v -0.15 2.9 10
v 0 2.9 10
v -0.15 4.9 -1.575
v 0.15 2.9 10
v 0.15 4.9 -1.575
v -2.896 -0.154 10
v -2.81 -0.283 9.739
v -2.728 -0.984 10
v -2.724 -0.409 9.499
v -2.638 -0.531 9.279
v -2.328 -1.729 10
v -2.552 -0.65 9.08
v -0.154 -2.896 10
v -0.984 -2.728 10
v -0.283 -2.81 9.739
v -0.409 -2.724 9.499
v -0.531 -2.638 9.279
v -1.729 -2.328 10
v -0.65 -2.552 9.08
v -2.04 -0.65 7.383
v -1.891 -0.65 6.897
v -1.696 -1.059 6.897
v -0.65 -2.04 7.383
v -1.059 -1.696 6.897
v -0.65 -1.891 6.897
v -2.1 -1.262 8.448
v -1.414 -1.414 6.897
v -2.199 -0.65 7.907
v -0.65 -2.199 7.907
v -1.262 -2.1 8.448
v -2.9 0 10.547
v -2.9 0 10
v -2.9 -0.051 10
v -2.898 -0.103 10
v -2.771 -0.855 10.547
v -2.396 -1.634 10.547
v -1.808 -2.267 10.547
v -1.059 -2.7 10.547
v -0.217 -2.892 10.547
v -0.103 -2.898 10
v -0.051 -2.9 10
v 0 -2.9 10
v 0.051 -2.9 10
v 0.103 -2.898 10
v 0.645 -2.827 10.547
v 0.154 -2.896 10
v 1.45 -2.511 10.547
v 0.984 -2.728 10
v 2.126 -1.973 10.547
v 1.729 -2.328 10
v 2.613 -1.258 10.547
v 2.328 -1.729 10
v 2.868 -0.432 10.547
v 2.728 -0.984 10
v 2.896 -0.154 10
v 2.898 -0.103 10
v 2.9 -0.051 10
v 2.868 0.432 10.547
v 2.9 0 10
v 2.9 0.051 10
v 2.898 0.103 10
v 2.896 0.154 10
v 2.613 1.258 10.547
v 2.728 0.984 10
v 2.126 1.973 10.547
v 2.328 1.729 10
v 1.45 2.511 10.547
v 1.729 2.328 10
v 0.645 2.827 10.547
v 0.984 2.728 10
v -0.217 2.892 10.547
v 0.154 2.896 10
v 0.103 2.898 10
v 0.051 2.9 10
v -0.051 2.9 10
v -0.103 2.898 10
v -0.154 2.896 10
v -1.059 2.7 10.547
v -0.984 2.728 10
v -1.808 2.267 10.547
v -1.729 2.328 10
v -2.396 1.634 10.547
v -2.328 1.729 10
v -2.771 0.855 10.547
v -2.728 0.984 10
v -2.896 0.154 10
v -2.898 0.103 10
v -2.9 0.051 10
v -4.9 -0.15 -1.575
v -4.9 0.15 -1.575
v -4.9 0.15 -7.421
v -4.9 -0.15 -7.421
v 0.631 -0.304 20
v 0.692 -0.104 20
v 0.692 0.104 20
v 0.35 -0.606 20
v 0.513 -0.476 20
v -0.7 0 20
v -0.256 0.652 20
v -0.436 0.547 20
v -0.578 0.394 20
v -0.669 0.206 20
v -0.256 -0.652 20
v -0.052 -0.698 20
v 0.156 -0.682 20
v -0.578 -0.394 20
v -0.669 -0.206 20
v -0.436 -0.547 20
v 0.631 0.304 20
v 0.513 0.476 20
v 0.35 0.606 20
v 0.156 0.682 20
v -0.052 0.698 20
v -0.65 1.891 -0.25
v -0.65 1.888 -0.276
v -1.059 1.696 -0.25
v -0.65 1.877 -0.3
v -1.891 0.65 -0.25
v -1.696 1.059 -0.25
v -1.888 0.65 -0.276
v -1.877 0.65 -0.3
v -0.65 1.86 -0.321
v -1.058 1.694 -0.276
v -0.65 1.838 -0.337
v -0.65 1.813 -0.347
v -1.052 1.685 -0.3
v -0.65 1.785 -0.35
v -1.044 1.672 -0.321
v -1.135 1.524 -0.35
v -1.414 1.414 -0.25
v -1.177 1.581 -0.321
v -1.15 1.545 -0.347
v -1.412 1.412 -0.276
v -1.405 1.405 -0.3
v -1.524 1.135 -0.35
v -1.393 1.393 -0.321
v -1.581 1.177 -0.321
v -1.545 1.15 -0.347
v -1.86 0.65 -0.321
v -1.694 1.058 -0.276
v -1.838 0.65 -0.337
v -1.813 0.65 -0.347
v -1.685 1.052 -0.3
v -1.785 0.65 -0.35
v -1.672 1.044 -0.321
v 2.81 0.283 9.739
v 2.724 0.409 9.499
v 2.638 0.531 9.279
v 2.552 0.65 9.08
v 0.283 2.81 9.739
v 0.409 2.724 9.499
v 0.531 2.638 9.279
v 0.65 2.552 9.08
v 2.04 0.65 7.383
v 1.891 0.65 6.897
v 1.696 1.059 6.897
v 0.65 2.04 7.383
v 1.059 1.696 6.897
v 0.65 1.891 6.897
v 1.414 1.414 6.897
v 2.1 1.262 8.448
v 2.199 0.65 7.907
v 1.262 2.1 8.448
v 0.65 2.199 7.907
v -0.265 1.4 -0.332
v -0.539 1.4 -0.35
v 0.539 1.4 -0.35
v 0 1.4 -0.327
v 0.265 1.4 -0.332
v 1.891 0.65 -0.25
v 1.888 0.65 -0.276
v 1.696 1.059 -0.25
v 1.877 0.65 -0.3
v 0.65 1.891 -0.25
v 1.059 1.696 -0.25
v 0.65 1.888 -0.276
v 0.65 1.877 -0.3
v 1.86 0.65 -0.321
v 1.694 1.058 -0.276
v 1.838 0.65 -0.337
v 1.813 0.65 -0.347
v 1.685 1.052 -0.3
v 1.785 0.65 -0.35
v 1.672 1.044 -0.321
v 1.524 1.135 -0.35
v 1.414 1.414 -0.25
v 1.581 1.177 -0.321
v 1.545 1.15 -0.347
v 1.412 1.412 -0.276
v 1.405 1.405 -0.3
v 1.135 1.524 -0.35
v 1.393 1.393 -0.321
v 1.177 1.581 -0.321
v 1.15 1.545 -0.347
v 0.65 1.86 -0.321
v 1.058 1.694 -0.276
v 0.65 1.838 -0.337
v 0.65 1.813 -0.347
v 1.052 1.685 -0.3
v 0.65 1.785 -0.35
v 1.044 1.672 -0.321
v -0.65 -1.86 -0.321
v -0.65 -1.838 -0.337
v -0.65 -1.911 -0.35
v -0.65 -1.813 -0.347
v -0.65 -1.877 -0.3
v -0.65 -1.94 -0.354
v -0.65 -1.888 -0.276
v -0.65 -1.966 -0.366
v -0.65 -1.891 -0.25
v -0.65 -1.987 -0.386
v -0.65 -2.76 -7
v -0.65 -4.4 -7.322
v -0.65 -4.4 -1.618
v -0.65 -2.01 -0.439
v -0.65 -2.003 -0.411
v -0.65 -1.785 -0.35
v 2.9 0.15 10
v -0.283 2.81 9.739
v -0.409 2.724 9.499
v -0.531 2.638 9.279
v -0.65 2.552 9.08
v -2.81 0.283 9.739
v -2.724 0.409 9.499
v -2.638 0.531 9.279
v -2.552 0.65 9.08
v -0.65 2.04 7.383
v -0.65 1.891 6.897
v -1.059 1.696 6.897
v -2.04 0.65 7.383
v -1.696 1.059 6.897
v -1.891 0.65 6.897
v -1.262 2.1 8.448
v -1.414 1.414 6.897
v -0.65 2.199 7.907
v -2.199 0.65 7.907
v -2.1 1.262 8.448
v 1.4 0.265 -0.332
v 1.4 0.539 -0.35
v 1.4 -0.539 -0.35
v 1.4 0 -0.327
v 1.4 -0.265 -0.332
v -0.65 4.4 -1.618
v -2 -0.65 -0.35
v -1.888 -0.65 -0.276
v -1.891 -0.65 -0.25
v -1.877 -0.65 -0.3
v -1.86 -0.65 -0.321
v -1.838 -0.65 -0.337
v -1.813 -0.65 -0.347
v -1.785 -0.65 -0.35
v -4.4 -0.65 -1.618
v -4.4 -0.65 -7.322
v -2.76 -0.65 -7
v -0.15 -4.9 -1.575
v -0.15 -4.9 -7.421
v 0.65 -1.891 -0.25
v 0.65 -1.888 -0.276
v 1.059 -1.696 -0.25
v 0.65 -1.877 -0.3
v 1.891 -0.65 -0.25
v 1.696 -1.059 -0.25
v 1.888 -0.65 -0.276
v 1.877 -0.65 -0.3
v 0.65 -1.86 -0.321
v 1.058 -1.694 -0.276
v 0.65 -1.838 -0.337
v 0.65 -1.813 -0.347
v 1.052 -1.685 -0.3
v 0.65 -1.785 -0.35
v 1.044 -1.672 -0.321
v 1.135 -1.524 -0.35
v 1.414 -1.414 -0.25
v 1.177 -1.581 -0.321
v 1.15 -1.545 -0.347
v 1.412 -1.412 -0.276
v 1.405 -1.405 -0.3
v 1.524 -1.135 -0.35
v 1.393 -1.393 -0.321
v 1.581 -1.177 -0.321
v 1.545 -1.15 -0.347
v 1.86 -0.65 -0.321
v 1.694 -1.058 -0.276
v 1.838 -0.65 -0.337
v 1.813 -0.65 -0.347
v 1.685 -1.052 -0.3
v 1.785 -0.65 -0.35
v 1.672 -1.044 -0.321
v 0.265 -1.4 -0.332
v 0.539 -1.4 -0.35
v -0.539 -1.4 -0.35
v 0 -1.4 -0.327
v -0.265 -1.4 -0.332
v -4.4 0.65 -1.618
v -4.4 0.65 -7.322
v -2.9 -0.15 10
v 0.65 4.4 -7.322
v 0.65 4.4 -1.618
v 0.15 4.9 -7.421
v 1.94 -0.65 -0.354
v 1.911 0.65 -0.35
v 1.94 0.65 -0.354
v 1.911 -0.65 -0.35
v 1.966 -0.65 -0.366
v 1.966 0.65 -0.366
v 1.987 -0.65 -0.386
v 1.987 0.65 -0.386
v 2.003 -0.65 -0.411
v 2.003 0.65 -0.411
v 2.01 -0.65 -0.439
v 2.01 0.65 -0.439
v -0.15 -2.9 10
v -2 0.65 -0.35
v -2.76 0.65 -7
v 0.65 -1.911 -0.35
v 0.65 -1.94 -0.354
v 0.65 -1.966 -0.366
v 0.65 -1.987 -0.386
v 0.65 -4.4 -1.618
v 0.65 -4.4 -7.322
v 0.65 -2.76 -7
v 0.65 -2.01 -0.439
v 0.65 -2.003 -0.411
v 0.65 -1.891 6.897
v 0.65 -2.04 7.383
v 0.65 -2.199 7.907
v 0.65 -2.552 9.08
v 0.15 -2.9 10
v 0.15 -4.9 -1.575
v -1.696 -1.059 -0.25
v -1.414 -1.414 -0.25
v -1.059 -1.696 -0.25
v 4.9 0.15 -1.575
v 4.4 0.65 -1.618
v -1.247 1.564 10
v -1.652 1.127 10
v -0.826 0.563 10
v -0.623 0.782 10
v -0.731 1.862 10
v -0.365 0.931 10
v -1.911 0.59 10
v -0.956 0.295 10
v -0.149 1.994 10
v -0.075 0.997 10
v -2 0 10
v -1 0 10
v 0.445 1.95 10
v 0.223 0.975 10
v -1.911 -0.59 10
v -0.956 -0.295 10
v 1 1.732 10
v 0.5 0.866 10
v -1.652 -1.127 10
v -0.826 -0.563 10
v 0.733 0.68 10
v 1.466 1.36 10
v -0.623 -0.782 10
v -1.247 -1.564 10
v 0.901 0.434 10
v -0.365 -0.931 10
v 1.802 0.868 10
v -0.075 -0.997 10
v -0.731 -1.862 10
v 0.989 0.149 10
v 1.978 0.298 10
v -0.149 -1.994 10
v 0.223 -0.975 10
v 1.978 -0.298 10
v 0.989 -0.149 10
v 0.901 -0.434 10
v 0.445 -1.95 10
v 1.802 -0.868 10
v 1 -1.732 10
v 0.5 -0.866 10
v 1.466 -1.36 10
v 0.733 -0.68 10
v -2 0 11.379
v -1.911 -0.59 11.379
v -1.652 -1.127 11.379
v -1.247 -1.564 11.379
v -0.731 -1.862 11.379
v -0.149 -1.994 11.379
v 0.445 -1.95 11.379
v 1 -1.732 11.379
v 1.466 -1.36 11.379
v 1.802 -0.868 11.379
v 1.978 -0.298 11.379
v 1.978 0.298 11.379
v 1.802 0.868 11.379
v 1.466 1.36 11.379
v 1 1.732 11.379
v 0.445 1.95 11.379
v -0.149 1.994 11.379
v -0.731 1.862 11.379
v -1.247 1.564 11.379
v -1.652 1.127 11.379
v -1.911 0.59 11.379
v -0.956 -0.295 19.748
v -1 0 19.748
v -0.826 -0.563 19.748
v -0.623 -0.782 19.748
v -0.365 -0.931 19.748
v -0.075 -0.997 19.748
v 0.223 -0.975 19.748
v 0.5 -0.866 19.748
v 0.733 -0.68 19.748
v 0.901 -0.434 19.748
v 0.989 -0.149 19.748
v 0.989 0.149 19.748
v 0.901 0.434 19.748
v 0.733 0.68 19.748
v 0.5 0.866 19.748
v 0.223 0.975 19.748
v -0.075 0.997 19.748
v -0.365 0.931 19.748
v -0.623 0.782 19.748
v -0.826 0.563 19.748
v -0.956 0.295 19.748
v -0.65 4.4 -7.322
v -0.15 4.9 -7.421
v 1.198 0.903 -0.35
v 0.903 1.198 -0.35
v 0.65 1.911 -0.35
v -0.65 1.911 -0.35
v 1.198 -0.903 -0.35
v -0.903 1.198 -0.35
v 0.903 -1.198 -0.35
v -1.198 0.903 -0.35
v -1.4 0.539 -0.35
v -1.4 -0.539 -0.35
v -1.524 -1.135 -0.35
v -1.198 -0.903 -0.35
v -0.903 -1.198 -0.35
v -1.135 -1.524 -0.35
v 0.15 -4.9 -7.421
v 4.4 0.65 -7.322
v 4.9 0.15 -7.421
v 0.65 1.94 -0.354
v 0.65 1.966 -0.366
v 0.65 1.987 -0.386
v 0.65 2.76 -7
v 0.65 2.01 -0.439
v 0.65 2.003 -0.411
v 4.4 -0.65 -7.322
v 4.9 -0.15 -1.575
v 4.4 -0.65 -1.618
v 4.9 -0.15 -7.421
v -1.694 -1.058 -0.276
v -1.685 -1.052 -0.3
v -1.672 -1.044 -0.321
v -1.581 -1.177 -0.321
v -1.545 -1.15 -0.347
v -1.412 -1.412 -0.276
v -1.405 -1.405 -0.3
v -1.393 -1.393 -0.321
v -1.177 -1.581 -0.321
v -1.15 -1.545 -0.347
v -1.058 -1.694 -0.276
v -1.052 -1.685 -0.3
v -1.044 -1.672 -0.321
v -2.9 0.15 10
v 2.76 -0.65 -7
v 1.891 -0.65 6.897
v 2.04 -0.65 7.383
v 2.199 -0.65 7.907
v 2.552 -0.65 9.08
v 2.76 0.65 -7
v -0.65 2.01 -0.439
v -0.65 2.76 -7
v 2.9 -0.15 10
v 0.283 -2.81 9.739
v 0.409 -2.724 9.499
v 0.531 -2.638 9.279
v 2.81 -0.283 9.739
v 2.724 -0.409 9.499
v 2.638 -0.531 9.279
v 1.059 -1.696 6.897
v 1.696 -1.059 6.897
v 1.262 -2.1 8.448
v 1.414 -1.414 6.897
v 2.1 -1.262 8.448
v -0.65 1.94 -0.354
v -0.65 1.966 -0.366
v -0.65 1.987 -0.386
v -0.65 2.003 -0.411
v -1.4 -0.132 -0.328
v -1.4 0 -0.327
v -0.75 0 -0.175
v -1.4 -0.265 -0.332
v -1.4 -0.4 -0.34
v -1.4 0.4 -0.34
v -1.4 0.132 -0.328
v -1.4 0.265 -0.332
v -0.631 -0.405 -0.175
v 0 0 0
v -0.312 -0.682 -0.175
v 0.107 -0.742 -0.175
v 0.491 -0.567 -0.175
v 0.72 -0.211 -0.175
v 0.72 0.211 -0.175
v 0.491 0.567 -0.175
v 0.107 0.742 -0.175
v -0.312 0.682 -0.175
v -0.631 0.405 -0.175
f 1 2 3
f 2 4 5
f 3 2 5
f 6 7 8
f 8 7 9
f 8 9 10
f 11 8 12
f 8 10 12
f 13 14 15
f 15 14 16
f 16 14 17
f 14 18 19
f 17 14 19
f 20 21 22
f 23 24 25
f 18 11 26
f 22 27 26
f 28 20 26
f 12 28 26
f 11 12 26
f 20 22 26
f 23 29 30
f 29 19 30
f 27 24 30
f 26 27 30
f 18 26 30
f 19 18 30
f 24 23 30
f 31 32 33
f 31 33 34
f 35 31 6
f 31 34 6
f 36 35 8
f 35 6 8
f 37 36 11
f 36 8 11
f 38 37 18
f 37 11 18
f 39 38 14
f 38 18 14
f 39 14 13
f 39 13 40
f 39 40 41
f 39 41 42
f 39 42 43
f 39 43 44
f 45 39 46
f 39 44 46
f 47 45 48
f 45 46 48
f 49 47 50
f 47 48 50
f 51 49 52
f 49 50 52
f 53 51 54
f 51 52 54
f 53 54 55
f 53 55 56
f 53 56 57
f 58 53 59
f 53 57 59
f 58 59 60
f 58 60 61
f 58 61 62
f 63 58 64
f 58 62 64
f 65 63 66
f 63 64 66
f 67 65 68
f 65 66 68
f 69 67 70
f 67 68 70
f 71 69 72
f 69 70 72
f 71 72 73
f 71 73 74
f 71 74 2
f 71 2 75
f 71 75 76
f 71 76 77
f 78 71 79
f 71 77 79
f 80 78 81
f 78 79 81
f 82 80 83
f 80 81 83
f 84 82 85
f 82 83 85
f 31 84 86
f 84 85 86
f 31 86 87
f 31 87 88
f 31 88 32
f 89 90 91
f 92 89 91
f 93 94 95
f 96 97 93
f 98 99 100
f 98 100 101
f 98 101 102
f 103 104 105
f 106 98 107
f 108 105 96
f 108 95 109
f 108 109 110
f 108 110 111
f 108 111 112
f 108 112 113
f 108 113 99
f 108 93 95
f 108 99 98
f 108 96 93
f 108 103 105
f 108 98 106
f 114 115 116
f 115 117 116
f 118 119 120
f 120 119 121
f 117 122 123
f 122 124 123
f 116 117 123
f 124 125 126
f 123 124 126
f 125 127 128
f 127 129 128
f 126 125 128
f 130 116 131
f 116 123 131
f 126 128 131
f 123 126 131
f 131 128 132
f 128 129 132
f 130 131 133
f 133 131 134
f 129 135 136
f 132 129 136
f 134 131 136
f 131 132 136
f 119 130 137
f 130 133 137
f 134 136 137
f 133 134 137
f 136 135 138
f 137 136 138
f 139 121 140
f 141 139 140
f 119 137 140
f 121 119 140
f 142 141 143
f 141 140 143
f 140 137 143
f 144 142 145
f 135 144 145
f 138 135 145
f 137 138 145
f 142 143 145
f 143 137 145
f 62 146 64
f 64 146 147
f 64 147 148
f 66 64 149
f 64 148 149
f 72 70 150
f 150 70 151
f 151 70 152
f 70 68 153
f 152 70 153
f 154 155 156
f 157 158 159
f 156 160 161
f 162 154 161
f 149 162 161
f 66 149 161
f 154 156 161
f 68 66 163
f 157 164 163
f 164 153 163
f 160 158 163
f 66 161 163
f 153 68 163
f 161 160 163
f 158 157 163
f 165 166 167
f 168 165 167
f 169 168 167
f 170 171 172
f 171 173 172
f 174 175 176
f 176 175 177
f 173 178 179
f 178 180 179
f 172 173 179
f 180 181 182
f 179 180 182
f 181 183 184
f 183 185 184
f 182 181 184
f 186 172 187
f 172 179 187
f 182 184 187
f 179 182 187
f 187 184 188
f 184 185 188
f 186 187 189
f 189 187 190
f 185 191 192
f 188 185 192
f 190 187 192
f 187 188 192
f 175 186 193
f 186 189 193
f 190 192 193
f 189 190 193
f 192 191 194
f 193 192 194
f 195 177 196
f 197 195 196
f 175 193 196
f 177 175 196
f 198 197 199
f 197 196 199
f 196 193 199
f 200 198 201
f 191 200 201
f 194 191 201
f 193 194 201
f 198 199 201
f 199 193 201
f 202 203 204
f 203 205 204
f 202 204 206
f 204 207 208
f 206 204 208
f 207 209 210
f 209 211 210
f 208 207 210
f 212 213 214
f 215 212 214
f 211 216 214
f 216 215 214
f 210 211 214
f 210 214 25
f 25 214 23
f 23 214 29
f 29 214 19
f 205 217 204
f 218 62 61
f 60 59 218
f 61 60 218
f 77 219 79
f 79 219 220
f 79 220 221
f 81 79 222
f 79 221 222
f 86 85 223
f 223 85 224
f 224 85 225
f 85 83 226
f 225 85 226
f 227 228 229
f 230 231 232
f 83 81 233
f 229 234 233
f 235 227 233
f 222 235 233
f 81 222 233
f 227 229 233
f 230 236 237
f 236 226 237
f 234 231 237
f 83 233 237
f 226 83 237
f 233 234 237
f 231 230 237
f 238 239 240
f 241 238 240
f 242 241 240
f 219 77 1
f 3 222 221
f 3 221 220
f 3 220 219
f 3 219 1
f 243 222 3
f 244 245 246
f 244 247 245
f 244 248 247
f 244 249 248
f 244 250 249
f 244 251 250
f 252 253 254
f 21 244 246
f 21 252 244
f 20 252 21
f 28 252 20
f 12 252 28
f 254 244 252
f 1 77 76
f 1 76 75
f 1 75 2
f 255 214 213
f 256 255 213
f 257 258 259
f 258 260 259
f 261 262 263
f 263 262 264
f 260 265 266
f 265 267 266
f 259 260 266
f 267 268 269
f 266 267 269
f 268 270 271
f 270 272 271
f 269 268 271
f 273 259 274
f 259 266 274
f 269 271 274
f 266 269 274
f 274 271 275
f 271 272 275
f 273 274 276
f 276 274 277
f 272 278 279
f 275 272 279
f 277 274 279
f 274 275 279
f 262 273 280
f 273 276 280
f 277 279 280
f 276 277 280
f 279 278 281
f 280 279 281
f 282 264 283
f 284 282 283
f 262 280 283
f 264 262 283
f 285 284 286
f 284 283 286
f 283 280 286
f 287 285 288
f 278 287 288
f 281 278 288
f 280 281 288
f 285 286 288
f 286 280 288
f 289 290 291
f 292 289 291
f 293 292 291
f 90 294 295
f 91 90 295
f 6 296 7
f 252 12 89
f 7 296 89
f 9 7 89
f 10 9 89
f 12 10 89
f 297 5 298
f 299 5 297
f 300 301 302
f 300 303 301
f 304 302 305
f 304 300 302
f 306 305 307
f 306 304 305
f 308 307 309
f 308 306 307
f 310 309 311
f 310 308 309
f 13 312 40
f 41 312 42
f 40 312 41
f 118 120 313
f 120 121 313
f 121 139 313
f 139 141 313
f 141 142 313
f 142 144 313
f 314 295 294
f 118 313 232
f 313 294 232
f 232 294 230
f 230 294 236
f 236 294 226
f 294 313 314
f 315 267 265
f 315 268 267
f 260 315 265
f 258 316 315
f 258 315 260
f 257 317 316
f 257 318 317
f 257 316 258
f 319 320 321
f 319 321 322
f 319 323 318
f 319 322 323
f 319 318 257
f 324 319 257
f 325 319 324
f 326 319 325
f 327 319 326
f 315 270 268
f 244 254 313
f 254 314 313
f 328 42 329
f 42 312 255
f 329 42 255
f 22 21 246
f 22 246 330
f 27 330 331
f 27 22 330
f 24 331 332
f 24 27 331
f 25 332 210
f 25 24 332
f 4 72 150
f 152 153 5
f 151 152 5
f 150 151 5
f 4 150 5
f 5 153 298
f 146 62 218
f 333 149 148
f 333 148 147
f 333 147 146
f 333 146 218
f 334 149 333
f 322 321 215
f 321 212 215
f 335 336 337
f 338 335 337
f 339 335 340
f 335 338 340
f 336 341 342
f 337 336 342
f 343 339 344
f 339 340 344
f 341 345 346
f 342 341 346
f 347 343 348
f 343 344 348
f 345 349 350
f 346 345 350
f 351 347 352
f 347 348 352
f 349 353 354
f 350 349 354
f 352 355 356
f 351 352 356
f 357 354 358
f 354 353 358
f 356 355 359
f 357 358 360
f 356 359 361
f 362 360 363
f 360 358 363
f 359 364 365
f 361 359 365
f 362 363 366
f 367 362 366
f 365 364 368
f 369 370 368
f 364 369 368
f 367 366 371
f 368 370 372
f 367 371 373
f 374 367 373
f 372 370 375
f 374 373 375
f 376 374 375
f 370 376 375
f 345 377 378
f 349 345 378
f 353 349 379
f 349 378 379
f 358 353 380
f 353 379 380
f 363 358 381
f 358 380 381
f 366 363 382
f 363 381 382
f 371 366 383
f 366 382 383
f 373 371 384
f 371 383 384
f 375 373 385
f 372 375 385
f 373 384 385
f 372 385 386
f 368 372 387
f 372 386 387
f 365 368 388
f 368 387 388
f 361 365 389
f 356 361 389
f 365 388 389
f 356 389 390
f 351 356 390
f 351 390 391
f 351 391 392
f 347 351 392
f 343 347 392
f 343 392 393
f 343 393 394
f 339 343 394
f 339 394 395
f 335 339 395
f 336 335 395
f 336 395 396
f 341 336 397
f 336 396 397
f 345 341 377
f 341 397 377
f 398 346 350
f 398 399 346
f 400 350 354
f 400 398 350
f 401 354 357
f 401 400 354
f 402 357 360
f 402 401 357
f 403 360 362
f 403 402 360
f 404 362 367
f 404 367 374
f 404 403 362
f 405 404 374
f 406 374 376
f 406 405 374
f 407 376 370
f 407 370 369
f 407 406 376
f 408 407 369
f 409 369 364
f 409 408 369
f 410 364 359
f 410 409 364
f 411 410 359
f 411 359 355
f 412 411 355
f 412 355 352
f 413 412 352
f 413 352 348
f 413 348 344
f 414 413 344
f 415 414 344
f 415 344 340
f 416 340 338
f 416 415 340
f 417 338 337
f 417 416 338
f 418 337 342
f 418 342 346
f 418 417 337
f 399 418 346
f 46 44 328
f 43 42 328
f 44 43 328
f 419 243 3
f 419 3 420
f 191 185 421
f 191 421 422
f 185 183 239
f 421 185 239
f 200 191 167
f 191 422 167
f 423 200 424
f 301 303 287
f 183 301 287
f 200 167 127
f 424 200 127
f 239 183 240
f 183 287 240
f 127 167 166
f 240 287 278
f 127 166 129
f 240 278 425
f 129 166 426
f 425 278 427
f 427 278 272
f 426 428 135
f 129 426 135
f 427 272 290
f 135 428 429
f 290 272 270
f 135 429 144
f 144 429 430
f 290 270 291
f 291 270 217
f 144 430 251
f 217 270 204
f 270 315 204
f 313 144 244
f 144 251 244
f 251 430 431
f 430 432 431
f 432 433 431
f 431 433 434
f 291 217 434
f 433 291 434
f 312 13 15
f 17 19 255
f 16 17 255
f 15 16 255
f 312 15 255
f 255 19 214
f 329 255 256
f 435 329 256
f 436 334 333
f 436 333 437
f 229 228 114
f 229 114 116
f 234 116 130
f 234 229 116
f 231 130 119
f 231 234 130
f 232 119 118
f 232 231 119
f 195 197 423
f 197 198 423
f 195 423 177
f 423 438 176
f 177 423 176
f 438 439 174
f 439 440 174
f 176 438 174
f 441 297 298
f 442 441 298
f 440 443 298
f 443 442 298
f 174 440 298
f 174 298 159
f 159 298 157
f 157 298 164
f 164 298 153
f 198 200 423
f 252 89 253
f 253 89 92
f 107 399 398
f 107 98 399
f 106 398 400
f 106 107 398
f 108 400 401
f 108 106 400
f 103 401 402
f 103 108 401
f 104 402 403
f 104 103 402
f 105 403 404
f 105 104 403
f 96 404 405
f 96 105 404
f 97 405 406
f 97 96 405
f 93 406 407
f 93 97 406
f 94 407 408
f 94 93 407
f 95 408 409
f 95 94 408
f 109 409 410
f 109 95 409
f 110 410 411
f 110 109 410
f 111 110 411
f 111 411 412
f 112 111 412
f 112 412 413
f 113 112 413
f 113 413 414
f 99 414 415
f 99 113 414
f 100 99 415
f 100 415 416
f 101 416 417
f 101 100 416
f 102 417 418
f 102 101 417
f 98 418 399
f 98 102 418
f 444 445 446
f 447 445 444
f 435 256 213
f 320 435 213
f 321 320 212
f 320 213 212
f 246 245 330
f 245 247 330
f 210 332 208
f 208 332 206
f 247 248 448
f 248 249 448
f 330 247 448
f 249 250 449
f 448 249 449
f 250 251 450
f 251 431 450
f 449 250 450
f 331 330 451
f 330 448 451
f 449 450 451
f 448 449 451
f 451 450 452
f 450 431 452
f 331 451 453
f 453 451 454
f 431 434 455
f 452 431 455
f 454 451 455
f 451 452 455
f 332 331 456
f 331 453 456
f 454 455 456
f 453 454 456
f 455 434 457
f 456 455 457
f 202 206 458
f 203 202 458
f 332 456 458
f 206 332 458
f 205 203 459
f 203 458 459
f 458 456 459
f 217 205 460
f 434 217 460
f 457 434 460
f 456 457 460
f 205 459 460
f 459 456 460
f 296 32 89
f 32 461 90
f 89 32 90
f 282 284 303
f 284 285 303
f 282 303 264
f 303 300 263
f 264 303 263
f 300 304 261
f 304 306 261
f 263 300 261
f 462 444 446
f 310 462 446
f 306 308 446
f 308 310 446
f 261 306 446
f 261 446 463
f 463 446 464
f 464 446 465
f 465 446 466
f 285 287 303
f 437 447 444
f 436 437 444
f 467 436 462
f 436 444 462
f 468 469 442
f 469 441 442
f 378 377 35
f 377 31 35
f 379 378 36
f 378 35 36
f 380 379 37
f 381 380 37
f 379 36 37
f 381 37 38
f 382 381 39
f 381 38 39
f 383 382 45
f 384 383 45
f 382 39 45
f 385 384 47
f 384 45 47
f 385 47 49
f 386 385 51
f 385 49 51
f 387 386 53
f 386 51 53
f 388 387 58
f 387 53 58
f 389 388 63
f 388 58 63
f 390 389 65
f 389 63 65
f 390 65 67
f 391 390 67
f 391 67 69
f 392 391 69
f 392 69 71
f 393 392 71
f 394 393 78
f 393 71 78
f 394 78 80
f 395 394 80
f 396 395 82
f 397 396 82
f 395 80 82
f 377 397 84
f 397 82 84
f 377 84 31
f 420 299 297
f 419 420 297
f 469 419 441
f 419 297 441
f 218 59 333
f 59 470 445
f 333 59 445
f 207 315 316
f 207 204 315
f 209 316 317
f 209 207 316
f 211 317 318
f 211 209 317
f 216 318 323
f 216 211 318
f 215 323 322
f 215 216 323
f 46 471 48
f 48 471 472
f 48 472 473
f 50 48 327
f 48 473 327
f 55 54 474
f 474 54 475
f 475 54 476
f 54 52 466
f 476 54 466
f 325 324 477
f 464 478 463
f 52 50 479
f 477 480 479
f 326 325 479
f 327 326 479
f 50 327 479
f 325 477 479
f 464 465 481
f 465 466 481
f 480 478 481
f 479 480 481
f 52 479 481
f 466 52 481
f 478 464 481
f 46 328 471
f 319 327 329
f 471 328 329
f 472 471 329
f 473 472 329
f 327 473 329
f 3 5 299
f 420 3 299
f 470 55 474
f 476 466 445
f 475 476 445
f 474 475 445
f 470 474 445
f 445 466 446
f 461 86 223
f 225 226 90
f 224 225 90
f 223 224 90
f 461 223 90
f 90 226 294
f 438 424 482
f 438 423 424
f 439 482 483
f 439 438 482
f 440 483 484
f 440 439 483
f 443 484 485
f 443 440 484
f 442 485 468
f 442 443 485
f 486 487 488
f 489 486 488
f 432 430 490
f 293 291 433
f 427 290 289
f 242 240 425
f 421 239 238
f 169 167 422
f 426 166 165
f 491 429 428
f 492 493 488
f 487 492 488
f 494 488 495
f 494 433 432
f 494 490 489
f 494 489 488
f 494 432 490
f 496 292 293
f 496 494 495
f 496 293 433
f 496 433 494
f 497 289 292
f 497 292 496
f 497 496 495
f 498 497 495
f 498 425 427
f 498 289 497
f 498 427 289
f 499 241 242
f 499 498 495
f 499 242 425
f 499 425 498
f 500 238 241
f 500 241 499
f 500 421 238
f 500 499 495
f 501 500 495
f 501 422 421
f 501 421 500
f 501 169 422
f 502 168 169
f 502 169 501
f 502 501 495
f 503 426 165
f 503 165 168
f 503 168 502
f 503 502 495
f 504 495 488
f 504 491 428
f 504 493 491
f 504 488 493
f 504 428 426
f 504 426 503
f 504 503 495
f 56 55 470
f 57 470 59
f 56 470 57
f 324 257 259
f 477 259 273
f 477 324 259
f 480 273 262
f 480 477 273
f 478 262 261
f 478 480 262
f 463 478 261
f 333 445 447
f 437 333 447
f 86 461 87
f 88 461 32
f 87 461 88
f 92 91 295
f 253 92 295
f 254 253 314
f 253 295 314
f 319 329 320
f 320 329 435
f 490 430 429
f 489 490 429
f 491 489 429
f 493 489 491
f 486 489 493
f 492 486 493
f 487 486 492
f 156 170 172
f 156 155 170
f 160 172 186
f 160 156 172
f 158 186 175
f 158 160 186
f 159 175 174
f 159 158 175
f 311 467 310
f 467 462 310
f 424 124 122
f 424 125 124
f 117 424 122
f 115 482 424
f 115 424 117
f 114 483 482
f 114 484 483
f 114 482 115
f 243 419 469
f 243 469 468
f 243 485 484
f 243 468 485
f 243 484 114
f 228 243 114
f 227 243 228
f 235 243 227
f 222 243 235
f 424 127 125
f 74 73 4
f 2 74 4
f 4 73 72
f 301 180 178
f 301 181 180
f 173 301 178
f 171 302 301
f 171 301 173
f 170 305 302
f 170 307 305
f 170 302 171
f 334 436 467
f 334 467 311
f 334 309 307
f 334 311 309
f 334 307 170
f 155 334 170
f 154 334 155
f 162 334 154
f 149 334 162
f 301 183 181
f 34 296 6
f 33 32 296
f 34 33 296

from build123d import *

# Parameters (mm, degrees)
EXTRUDE_1_DEPTH                      = 0.65
CHAMFER_1_SIZE                       = 0.5
PATTERN_CIRCULAR_2_COUNT             = 4
CHAMFER_1_OF_PATTERN_CIRCULAR_2_SIZE = 0.5
FILLET_1_R                           = 0.1


with BuildPart() as part:
    # 스케치1 → 회전1 (revolve)
    with BuildSketch(Plane(origin=(0, 0, 0), x_dir=(1, 0, 0), z_dir=(0, 1, 0)), mode=Mode.PRIVATE) as revolve_1_sk:
        Polygon((0, 0), (1.5, 0.34993434), (2, 0.34993434), (2, -10), (1, -10), (1, -19.748270111), (0.7, -20), (0, -20), align=None)
    revolve(revolve_1_sk.sketch.rotate(Axis((0, 0, 0), (0, 0, 1)), 180), axis=Axis((0, 0, 0), (0, 0, 1)))

    # 스케치2 → 보스-돌출1 (add, symmetric)
    with BuildSketch(Plane(origin=(0, 0, 0), x_dir=(0, 0, -1), z_dir=(1, 0, 0))):
        Polygon((-10, 2.9), (1.575466057, 4.9), (7.420556651, 4.9), (7, 2.759707009), (0.34993434, 2), (0.34993434, 1.4), (-10, 1.4), align=None)
    extrude_1 = extrude(amount=EXTRUDE_1_DEPTH, both=True)

    # 모따기1
    chamfer_1_edges = [part.edges().sort_by_distance(p)[0] for p in [
        (0.65, 4.9, -4.498011354),
        (0.65, 3.9, 4.212266971),
        (-0.65, 4.9, -4.498011354),
        (-0.65, 3.9, 4.212266971),
    ]]
    chamfer(chamfer_1_edges, length=CHAMFER_1_SIZE)

    # 원형 패턴2: 보스-돌출1 ×4 about axis
    pattern_circular_2_axis = Axis((0, 0, 0), (0, 0, 1))
    for i in range(1, PATTERN_CIRCULAR_2_COUNT):
        add(extrude_1.rotate(pattern_circular_2_axis, i * 360 / PATTERN_CIRCULAR_2_COUNT))

    # 모따기1 of 원형 패턴2
    chamfer_1_of_pattern_circular_2_edges = [part.edges().sort_by_distance(p)[0] for p in [
        (-4.9, 0.65, -4.498011354),
        (-3.9, 0.65, 4.212266971),
        (-4.9, -0.65, -4.498011354),
        (-3.9, -0.65, 4.212266971),
        (-0.65, -4.9, -4.498011354),
        (-0.65, -3.9, 4.212266971),
        (0.65, -4.9, -4.498011354),
        (0.65, -3.9, 4.212266971),
        (4.9, -0.65, -4.498011354),
        (3.9, -0.65, 4.212266971),
        (4.9, 0.65, -4.498011354),
        (3.9, 0.65, 4.212266971),
    ]]
    chamfer(chamfer_1_of_pattern_circular_2_edges, length=CHAMFER_1_OF_PATTERN_CIRCULAR_2_SIZE)

    # 필렛1
    fillet_1_edges = [part.edges().sort_by_distance(p)[0] for p in [
        (0, -2, -0.34993434),
        (-1.414213562, 1.414213562, -0.34993434),
        (1.414213562, 1.414213562, -0.34993434),
        (0, 2, -0.34993434),
        (1.414213562, -1.414213562, -0.34993434),
        (2, 0, -0.34993434),
        (-1.414213562, -1.414213562, -0.34993434),
    ]]
    fillet(fillet_1_edges, radius=FILLET_1_R)

    # 스케치3 → 회전2 (revolve)
    with BuildSketch(Plane(origin=(0, 0, 0), x_dir=(0, 0, -1), z_dir=(1, 0, 0)), mode=Mode.PRIVATE) as revolve_2_sk:
        Polygon((-10, 2.9), (0, 0), (-10, 0), (-10, 2), (-11.378788521, 2), (-10.54680135, 2.9), align=None)
    revolve(revolve_2_sk.sketch.rotate(Axis((0, 0, 0), (0, 0, 1)), 90), axis=Axis((0, 0, 0), (0, 0, 1)))


solid = part.part
